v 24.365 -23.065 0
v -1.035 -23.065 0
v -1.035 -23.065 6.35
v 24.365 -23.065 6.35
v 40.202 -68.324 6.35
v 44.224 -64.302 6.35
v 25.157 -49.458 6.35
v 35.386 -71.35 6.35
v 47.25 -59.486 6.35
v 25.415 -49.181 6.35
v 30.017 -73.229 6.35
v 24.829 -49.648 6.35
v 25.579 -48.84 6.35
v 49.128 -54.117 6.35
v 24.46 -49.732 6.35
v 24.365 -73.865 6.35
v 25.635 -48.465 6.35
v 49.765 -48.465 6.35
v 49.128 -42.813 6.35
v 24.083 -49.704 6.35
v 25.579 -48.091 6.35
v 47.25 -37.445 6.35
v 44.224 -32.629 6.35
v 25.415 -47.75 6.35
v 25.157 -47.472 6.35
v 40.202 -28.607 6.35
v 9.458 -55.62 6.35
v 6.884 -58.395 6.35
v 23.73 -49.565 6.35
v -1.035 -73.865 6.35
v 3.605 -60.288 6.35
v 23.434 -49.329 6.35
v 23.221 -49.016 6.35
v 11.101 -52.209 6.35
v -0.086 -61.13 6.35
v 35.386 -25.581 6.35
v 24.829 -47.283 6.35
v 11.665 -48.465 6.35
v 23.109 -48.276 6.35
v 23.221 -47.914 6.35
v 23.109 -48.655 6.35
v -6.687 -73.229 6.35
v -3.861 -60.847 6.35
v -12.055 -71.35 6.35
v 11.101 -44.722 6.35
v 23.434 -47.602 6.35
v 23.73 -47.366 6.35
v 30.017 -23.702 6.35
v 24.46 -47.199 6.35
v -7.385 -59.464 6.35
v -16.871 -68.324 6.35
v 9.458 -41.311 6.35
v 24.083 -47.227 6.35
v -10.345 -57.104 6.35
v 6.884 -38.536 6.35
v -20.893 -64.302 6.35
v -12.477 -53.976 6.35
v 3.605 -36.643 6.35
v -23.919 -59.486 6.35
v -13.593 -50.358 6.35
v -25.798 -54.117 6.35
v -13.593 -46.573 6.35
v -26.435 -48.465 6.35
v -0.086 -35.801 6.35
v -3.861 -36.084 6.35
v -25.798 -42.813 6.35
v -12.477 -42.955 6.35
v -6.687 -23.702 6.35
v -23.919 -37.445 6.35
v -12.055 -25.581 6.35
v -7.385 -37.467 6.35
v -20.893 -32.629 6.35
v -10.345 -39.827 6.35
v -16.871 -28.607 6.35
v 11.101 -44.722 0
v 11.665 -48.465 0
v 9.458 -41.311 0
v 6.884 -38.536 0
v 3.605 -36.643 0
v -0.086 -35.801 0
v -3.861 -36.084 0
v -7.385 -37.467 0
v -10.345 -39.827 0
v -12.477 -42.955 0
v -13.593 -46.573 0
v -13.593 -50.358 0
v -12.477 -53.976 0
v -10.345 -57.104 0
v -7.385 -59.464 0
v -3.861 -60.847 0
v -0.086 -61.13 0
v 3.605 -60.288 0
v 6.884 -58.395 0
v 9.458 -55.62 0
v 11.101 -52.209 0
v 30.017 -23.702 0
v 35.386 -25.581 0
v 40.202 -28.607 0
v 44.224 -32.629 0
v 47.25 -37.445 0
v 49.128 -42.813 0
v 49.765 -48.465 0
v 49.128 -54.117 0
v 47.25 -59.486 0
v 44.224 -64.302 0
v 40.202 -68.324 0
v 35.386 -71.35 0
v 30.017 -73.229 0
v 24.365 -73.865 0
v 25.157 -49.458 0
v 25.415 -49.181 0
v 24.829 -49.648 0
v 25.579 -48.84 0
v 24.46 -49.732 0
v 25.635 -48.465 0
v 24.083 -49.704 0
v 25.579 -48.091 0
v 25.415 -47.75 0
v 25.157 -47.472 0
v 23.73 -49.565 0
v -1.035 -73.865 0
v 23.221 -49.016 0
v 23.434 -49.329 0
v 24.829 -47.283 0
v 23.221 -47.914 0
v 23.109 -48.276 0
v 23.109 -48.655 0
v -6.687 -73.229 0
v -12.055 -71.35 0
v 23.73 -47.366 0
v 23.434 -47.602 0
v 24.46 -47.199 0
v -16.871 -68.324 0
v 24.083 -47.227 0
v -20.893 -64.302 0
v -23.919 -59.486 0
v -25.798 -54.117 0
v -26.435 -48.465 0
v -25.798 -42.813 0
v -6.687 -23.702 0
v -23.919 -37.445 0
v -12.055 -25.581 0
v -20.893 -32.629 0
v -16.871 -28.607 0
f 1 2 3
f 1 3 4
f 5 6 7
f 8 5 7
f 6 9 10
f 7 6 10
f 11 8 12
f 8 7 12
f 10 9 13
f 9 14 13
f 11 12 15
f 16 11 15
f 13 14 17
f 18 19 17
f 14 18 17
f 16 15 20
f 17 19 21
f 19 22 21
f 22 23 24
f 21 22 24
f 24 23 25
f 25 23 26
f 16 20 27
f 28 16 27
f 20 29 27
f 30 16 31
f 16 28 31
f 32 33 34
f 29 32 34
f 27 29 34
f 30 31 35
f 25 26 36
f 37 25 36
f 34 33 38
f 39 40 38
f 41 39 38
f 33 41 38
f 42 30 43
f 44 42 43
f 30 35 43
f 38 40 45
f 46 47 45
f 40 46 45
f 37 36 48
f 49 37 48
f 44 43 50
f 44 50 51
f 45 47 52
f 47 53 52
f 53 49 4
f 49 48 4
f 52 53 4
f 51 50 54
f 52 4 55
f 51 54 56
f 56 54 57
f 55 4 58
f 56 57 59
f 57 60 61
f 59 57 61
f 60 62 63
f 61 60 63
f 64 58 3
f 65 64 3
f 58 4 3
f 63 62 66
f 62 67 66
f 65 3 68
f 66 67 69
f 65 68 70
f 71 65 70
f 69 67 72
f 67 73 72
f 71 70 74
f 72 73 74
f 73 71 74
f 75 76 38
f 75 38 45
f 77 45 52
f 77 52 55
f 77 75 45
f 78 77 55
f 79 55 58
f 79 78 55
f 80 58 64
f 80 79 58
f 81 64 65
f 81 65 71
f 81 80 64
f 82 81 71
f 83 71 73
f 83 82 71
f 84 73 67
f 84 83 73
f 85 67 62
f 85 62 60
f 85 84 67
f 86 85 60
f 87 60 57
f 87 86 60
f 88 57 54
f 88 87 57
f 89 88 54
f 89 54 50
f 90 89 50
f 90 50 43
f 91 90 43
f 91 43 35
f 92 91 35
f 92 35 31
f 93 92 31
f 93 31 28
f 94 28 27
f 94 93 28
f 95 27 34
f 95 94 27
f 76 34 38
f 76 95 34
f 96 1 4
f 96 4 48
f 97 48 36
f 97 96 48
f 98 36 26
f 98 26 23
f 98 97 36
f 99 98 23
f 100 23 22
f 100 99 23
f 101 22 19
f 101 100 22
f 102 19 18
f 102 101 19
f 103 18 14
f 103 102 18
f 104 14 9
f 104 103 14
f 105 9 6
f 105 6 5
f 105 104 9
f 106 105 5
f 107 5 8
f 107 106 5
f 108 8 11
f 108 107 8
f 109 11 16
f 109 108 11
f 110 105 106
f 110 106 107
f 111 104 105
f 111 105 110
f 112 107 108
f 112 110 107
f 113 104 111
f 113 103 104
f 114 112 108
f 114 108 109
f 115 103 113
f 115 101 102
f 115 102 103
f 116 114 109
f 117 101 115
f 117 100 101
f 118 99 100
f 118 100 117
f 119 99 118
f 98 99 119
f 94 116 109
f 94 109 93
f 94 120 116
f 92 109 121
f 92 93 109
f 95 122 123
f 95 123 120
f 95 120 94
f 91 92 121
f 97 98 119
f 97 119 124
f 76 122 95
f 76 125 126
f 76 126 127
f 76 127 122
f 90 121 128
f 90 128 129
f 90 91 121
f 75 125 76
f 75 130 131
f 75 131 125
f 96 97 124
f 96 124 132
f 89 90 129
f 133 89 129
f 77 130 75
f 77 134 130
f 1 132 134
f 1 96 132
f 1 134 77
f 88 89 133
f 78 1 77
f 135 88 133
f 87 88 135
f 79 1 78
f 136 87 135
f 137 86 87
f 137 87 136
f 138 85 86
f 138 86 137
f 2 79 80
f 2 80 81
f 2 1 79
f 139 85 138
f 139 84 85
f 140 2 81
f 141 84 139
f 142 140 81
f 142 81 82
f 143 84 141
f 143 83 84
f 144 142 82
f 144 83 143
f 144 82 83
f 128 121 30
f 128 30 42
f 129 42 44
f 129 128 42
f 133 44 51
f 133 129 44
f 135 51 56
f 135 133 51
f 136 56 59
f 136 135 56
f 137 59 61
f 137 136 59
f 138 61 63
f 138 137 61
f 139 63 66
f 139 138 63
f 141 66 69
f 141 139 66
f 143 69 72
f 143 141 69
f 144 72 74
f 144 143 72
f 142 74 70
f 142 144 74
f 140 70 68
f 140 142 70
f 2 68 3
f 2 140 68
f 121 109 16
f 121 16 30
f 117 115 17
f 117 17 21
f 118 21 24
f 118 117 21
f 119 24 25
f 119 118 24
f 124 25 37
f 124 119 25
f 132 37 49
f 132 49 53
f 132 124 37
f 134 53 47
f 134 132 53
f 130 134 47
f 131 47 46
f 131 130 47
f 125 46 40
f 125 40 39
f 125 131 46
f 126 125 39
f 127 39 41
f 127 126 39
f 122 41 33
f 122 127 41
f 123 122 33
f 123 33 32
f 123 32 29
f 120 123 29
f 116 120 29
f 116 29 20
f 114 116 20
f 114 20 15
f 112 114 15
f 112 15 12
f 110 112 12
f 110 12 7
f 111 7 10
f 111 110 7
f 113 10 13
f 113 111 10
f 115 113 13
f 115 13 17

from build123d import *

# Parameters (mm, degrees)
BOSS_EXTRUDE1_DEPTH = 6.35
SKETCH3_6_R         = 12.7
CUT_EXTRUDE1_DEPTH  = 6.35
SKETCH3_9_R         = 1.27
CUT_EXTRUDE5_DEPTH  = 6.35


with BuildPart() as part:
    # Sketch3 → Boss-Extrude1 (new body)
    with BuildSketch(Plane.XY):
        with BuildLine():
            Line((-1.03476248, -23.06540758), (24.36523752, -23.06540758))
            ThreePointArc((24.36523752, -23.06540758), (49.76523752, -48.46540758), (24.36523752, -73.86540758))
            Line((24.36523752, -73.86540758), (-1.03476248, -73.86540758))
            ThreePointArc((-1.03476248, -73.86540758), (-26.43476248, -48.46540758), (-1.03476248, -23.06540758))
        make_face()
    extrude(amount=BOSS_EXTRUDE1_DEPTH)

    # Sketch3<6> → Cut-Extrude1 (cut)
    with BuildSketch(Plane.XY):
        with Locations((-1.03476248, -48.46540758)):
            Circle(SKETCH3_6_R)
    extrude(amount=CUT_EXTRUDE1_DEPTH, mode=Mode.SUBTRACT)

    # Sketch3<9> → Cut-Extrude5 (cut)
    with BuildSketch(Plane.XY):
        with Locations((24.36523752, -48.46540758)):
            Circle(SKETCH3_9_R)
    extrude(amount=CUT_EXTRUDE5_DEPTH, mode=Mode.SUBTRACT)


solid = part.part
